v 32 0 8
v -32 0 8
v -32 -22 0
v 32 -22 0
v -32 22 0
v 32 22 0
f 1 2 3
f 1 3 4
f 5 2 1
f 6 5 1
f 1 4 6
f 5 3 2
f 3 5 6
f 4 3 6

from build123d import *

# Parameters (mm, degrees)
F0_W       = 64
F0_H       = 44
F1_DEPTH   = 8
F2_SIZE2   = 21.99999
F2_SIZE    = 7.99999
F2_2_SIZE2 = 21.99999
F2_2_SIZE  = 7.99999


# Not quite as in the source:
# - a fillet or chamfer is up to 0.001 mm smaller than in the source, because OpenCascade refuses the exact size


with BuildPart() as f1:
    # F0 (on Top) → F1 (new body)
    with BuildSketch(Plane.XY):
        Rectangle(F0_W, F0_H)
    extrude(amount=F1_DEPTH)

    # F2 (size 8 and 22 in the source; OpenCascade refuses exactly that, so slightly less here)
    f2_edges = [f1.edges().sort_by_distance(p)[0] for p in [
        (0, -22, 8),
    ]]
    f2_side = f1.faces().sort_by_distance((0, -22, 4))[0]
    chamfer(f2_edges, length=F2_SIZE, length2=F2_SIZE2, reference=f2_side)

    # F2#2 (size 8 and 22 in the source; OpenCascade refuses exactly that, so slightly less here)
    f2_2_edges = [f1.edges().sort_by_distance(p)[0] for p in [
        (0, 22, 8),
    ]]
    f2_2_side = f1.faces().sort_by_distance((0, 22, 4))[0]
    chamfer(f2_2_edges, length=F2_2_SIZE, length2=F2_2_SIZE2, reference=f2_2_side)


solid = f1.part
